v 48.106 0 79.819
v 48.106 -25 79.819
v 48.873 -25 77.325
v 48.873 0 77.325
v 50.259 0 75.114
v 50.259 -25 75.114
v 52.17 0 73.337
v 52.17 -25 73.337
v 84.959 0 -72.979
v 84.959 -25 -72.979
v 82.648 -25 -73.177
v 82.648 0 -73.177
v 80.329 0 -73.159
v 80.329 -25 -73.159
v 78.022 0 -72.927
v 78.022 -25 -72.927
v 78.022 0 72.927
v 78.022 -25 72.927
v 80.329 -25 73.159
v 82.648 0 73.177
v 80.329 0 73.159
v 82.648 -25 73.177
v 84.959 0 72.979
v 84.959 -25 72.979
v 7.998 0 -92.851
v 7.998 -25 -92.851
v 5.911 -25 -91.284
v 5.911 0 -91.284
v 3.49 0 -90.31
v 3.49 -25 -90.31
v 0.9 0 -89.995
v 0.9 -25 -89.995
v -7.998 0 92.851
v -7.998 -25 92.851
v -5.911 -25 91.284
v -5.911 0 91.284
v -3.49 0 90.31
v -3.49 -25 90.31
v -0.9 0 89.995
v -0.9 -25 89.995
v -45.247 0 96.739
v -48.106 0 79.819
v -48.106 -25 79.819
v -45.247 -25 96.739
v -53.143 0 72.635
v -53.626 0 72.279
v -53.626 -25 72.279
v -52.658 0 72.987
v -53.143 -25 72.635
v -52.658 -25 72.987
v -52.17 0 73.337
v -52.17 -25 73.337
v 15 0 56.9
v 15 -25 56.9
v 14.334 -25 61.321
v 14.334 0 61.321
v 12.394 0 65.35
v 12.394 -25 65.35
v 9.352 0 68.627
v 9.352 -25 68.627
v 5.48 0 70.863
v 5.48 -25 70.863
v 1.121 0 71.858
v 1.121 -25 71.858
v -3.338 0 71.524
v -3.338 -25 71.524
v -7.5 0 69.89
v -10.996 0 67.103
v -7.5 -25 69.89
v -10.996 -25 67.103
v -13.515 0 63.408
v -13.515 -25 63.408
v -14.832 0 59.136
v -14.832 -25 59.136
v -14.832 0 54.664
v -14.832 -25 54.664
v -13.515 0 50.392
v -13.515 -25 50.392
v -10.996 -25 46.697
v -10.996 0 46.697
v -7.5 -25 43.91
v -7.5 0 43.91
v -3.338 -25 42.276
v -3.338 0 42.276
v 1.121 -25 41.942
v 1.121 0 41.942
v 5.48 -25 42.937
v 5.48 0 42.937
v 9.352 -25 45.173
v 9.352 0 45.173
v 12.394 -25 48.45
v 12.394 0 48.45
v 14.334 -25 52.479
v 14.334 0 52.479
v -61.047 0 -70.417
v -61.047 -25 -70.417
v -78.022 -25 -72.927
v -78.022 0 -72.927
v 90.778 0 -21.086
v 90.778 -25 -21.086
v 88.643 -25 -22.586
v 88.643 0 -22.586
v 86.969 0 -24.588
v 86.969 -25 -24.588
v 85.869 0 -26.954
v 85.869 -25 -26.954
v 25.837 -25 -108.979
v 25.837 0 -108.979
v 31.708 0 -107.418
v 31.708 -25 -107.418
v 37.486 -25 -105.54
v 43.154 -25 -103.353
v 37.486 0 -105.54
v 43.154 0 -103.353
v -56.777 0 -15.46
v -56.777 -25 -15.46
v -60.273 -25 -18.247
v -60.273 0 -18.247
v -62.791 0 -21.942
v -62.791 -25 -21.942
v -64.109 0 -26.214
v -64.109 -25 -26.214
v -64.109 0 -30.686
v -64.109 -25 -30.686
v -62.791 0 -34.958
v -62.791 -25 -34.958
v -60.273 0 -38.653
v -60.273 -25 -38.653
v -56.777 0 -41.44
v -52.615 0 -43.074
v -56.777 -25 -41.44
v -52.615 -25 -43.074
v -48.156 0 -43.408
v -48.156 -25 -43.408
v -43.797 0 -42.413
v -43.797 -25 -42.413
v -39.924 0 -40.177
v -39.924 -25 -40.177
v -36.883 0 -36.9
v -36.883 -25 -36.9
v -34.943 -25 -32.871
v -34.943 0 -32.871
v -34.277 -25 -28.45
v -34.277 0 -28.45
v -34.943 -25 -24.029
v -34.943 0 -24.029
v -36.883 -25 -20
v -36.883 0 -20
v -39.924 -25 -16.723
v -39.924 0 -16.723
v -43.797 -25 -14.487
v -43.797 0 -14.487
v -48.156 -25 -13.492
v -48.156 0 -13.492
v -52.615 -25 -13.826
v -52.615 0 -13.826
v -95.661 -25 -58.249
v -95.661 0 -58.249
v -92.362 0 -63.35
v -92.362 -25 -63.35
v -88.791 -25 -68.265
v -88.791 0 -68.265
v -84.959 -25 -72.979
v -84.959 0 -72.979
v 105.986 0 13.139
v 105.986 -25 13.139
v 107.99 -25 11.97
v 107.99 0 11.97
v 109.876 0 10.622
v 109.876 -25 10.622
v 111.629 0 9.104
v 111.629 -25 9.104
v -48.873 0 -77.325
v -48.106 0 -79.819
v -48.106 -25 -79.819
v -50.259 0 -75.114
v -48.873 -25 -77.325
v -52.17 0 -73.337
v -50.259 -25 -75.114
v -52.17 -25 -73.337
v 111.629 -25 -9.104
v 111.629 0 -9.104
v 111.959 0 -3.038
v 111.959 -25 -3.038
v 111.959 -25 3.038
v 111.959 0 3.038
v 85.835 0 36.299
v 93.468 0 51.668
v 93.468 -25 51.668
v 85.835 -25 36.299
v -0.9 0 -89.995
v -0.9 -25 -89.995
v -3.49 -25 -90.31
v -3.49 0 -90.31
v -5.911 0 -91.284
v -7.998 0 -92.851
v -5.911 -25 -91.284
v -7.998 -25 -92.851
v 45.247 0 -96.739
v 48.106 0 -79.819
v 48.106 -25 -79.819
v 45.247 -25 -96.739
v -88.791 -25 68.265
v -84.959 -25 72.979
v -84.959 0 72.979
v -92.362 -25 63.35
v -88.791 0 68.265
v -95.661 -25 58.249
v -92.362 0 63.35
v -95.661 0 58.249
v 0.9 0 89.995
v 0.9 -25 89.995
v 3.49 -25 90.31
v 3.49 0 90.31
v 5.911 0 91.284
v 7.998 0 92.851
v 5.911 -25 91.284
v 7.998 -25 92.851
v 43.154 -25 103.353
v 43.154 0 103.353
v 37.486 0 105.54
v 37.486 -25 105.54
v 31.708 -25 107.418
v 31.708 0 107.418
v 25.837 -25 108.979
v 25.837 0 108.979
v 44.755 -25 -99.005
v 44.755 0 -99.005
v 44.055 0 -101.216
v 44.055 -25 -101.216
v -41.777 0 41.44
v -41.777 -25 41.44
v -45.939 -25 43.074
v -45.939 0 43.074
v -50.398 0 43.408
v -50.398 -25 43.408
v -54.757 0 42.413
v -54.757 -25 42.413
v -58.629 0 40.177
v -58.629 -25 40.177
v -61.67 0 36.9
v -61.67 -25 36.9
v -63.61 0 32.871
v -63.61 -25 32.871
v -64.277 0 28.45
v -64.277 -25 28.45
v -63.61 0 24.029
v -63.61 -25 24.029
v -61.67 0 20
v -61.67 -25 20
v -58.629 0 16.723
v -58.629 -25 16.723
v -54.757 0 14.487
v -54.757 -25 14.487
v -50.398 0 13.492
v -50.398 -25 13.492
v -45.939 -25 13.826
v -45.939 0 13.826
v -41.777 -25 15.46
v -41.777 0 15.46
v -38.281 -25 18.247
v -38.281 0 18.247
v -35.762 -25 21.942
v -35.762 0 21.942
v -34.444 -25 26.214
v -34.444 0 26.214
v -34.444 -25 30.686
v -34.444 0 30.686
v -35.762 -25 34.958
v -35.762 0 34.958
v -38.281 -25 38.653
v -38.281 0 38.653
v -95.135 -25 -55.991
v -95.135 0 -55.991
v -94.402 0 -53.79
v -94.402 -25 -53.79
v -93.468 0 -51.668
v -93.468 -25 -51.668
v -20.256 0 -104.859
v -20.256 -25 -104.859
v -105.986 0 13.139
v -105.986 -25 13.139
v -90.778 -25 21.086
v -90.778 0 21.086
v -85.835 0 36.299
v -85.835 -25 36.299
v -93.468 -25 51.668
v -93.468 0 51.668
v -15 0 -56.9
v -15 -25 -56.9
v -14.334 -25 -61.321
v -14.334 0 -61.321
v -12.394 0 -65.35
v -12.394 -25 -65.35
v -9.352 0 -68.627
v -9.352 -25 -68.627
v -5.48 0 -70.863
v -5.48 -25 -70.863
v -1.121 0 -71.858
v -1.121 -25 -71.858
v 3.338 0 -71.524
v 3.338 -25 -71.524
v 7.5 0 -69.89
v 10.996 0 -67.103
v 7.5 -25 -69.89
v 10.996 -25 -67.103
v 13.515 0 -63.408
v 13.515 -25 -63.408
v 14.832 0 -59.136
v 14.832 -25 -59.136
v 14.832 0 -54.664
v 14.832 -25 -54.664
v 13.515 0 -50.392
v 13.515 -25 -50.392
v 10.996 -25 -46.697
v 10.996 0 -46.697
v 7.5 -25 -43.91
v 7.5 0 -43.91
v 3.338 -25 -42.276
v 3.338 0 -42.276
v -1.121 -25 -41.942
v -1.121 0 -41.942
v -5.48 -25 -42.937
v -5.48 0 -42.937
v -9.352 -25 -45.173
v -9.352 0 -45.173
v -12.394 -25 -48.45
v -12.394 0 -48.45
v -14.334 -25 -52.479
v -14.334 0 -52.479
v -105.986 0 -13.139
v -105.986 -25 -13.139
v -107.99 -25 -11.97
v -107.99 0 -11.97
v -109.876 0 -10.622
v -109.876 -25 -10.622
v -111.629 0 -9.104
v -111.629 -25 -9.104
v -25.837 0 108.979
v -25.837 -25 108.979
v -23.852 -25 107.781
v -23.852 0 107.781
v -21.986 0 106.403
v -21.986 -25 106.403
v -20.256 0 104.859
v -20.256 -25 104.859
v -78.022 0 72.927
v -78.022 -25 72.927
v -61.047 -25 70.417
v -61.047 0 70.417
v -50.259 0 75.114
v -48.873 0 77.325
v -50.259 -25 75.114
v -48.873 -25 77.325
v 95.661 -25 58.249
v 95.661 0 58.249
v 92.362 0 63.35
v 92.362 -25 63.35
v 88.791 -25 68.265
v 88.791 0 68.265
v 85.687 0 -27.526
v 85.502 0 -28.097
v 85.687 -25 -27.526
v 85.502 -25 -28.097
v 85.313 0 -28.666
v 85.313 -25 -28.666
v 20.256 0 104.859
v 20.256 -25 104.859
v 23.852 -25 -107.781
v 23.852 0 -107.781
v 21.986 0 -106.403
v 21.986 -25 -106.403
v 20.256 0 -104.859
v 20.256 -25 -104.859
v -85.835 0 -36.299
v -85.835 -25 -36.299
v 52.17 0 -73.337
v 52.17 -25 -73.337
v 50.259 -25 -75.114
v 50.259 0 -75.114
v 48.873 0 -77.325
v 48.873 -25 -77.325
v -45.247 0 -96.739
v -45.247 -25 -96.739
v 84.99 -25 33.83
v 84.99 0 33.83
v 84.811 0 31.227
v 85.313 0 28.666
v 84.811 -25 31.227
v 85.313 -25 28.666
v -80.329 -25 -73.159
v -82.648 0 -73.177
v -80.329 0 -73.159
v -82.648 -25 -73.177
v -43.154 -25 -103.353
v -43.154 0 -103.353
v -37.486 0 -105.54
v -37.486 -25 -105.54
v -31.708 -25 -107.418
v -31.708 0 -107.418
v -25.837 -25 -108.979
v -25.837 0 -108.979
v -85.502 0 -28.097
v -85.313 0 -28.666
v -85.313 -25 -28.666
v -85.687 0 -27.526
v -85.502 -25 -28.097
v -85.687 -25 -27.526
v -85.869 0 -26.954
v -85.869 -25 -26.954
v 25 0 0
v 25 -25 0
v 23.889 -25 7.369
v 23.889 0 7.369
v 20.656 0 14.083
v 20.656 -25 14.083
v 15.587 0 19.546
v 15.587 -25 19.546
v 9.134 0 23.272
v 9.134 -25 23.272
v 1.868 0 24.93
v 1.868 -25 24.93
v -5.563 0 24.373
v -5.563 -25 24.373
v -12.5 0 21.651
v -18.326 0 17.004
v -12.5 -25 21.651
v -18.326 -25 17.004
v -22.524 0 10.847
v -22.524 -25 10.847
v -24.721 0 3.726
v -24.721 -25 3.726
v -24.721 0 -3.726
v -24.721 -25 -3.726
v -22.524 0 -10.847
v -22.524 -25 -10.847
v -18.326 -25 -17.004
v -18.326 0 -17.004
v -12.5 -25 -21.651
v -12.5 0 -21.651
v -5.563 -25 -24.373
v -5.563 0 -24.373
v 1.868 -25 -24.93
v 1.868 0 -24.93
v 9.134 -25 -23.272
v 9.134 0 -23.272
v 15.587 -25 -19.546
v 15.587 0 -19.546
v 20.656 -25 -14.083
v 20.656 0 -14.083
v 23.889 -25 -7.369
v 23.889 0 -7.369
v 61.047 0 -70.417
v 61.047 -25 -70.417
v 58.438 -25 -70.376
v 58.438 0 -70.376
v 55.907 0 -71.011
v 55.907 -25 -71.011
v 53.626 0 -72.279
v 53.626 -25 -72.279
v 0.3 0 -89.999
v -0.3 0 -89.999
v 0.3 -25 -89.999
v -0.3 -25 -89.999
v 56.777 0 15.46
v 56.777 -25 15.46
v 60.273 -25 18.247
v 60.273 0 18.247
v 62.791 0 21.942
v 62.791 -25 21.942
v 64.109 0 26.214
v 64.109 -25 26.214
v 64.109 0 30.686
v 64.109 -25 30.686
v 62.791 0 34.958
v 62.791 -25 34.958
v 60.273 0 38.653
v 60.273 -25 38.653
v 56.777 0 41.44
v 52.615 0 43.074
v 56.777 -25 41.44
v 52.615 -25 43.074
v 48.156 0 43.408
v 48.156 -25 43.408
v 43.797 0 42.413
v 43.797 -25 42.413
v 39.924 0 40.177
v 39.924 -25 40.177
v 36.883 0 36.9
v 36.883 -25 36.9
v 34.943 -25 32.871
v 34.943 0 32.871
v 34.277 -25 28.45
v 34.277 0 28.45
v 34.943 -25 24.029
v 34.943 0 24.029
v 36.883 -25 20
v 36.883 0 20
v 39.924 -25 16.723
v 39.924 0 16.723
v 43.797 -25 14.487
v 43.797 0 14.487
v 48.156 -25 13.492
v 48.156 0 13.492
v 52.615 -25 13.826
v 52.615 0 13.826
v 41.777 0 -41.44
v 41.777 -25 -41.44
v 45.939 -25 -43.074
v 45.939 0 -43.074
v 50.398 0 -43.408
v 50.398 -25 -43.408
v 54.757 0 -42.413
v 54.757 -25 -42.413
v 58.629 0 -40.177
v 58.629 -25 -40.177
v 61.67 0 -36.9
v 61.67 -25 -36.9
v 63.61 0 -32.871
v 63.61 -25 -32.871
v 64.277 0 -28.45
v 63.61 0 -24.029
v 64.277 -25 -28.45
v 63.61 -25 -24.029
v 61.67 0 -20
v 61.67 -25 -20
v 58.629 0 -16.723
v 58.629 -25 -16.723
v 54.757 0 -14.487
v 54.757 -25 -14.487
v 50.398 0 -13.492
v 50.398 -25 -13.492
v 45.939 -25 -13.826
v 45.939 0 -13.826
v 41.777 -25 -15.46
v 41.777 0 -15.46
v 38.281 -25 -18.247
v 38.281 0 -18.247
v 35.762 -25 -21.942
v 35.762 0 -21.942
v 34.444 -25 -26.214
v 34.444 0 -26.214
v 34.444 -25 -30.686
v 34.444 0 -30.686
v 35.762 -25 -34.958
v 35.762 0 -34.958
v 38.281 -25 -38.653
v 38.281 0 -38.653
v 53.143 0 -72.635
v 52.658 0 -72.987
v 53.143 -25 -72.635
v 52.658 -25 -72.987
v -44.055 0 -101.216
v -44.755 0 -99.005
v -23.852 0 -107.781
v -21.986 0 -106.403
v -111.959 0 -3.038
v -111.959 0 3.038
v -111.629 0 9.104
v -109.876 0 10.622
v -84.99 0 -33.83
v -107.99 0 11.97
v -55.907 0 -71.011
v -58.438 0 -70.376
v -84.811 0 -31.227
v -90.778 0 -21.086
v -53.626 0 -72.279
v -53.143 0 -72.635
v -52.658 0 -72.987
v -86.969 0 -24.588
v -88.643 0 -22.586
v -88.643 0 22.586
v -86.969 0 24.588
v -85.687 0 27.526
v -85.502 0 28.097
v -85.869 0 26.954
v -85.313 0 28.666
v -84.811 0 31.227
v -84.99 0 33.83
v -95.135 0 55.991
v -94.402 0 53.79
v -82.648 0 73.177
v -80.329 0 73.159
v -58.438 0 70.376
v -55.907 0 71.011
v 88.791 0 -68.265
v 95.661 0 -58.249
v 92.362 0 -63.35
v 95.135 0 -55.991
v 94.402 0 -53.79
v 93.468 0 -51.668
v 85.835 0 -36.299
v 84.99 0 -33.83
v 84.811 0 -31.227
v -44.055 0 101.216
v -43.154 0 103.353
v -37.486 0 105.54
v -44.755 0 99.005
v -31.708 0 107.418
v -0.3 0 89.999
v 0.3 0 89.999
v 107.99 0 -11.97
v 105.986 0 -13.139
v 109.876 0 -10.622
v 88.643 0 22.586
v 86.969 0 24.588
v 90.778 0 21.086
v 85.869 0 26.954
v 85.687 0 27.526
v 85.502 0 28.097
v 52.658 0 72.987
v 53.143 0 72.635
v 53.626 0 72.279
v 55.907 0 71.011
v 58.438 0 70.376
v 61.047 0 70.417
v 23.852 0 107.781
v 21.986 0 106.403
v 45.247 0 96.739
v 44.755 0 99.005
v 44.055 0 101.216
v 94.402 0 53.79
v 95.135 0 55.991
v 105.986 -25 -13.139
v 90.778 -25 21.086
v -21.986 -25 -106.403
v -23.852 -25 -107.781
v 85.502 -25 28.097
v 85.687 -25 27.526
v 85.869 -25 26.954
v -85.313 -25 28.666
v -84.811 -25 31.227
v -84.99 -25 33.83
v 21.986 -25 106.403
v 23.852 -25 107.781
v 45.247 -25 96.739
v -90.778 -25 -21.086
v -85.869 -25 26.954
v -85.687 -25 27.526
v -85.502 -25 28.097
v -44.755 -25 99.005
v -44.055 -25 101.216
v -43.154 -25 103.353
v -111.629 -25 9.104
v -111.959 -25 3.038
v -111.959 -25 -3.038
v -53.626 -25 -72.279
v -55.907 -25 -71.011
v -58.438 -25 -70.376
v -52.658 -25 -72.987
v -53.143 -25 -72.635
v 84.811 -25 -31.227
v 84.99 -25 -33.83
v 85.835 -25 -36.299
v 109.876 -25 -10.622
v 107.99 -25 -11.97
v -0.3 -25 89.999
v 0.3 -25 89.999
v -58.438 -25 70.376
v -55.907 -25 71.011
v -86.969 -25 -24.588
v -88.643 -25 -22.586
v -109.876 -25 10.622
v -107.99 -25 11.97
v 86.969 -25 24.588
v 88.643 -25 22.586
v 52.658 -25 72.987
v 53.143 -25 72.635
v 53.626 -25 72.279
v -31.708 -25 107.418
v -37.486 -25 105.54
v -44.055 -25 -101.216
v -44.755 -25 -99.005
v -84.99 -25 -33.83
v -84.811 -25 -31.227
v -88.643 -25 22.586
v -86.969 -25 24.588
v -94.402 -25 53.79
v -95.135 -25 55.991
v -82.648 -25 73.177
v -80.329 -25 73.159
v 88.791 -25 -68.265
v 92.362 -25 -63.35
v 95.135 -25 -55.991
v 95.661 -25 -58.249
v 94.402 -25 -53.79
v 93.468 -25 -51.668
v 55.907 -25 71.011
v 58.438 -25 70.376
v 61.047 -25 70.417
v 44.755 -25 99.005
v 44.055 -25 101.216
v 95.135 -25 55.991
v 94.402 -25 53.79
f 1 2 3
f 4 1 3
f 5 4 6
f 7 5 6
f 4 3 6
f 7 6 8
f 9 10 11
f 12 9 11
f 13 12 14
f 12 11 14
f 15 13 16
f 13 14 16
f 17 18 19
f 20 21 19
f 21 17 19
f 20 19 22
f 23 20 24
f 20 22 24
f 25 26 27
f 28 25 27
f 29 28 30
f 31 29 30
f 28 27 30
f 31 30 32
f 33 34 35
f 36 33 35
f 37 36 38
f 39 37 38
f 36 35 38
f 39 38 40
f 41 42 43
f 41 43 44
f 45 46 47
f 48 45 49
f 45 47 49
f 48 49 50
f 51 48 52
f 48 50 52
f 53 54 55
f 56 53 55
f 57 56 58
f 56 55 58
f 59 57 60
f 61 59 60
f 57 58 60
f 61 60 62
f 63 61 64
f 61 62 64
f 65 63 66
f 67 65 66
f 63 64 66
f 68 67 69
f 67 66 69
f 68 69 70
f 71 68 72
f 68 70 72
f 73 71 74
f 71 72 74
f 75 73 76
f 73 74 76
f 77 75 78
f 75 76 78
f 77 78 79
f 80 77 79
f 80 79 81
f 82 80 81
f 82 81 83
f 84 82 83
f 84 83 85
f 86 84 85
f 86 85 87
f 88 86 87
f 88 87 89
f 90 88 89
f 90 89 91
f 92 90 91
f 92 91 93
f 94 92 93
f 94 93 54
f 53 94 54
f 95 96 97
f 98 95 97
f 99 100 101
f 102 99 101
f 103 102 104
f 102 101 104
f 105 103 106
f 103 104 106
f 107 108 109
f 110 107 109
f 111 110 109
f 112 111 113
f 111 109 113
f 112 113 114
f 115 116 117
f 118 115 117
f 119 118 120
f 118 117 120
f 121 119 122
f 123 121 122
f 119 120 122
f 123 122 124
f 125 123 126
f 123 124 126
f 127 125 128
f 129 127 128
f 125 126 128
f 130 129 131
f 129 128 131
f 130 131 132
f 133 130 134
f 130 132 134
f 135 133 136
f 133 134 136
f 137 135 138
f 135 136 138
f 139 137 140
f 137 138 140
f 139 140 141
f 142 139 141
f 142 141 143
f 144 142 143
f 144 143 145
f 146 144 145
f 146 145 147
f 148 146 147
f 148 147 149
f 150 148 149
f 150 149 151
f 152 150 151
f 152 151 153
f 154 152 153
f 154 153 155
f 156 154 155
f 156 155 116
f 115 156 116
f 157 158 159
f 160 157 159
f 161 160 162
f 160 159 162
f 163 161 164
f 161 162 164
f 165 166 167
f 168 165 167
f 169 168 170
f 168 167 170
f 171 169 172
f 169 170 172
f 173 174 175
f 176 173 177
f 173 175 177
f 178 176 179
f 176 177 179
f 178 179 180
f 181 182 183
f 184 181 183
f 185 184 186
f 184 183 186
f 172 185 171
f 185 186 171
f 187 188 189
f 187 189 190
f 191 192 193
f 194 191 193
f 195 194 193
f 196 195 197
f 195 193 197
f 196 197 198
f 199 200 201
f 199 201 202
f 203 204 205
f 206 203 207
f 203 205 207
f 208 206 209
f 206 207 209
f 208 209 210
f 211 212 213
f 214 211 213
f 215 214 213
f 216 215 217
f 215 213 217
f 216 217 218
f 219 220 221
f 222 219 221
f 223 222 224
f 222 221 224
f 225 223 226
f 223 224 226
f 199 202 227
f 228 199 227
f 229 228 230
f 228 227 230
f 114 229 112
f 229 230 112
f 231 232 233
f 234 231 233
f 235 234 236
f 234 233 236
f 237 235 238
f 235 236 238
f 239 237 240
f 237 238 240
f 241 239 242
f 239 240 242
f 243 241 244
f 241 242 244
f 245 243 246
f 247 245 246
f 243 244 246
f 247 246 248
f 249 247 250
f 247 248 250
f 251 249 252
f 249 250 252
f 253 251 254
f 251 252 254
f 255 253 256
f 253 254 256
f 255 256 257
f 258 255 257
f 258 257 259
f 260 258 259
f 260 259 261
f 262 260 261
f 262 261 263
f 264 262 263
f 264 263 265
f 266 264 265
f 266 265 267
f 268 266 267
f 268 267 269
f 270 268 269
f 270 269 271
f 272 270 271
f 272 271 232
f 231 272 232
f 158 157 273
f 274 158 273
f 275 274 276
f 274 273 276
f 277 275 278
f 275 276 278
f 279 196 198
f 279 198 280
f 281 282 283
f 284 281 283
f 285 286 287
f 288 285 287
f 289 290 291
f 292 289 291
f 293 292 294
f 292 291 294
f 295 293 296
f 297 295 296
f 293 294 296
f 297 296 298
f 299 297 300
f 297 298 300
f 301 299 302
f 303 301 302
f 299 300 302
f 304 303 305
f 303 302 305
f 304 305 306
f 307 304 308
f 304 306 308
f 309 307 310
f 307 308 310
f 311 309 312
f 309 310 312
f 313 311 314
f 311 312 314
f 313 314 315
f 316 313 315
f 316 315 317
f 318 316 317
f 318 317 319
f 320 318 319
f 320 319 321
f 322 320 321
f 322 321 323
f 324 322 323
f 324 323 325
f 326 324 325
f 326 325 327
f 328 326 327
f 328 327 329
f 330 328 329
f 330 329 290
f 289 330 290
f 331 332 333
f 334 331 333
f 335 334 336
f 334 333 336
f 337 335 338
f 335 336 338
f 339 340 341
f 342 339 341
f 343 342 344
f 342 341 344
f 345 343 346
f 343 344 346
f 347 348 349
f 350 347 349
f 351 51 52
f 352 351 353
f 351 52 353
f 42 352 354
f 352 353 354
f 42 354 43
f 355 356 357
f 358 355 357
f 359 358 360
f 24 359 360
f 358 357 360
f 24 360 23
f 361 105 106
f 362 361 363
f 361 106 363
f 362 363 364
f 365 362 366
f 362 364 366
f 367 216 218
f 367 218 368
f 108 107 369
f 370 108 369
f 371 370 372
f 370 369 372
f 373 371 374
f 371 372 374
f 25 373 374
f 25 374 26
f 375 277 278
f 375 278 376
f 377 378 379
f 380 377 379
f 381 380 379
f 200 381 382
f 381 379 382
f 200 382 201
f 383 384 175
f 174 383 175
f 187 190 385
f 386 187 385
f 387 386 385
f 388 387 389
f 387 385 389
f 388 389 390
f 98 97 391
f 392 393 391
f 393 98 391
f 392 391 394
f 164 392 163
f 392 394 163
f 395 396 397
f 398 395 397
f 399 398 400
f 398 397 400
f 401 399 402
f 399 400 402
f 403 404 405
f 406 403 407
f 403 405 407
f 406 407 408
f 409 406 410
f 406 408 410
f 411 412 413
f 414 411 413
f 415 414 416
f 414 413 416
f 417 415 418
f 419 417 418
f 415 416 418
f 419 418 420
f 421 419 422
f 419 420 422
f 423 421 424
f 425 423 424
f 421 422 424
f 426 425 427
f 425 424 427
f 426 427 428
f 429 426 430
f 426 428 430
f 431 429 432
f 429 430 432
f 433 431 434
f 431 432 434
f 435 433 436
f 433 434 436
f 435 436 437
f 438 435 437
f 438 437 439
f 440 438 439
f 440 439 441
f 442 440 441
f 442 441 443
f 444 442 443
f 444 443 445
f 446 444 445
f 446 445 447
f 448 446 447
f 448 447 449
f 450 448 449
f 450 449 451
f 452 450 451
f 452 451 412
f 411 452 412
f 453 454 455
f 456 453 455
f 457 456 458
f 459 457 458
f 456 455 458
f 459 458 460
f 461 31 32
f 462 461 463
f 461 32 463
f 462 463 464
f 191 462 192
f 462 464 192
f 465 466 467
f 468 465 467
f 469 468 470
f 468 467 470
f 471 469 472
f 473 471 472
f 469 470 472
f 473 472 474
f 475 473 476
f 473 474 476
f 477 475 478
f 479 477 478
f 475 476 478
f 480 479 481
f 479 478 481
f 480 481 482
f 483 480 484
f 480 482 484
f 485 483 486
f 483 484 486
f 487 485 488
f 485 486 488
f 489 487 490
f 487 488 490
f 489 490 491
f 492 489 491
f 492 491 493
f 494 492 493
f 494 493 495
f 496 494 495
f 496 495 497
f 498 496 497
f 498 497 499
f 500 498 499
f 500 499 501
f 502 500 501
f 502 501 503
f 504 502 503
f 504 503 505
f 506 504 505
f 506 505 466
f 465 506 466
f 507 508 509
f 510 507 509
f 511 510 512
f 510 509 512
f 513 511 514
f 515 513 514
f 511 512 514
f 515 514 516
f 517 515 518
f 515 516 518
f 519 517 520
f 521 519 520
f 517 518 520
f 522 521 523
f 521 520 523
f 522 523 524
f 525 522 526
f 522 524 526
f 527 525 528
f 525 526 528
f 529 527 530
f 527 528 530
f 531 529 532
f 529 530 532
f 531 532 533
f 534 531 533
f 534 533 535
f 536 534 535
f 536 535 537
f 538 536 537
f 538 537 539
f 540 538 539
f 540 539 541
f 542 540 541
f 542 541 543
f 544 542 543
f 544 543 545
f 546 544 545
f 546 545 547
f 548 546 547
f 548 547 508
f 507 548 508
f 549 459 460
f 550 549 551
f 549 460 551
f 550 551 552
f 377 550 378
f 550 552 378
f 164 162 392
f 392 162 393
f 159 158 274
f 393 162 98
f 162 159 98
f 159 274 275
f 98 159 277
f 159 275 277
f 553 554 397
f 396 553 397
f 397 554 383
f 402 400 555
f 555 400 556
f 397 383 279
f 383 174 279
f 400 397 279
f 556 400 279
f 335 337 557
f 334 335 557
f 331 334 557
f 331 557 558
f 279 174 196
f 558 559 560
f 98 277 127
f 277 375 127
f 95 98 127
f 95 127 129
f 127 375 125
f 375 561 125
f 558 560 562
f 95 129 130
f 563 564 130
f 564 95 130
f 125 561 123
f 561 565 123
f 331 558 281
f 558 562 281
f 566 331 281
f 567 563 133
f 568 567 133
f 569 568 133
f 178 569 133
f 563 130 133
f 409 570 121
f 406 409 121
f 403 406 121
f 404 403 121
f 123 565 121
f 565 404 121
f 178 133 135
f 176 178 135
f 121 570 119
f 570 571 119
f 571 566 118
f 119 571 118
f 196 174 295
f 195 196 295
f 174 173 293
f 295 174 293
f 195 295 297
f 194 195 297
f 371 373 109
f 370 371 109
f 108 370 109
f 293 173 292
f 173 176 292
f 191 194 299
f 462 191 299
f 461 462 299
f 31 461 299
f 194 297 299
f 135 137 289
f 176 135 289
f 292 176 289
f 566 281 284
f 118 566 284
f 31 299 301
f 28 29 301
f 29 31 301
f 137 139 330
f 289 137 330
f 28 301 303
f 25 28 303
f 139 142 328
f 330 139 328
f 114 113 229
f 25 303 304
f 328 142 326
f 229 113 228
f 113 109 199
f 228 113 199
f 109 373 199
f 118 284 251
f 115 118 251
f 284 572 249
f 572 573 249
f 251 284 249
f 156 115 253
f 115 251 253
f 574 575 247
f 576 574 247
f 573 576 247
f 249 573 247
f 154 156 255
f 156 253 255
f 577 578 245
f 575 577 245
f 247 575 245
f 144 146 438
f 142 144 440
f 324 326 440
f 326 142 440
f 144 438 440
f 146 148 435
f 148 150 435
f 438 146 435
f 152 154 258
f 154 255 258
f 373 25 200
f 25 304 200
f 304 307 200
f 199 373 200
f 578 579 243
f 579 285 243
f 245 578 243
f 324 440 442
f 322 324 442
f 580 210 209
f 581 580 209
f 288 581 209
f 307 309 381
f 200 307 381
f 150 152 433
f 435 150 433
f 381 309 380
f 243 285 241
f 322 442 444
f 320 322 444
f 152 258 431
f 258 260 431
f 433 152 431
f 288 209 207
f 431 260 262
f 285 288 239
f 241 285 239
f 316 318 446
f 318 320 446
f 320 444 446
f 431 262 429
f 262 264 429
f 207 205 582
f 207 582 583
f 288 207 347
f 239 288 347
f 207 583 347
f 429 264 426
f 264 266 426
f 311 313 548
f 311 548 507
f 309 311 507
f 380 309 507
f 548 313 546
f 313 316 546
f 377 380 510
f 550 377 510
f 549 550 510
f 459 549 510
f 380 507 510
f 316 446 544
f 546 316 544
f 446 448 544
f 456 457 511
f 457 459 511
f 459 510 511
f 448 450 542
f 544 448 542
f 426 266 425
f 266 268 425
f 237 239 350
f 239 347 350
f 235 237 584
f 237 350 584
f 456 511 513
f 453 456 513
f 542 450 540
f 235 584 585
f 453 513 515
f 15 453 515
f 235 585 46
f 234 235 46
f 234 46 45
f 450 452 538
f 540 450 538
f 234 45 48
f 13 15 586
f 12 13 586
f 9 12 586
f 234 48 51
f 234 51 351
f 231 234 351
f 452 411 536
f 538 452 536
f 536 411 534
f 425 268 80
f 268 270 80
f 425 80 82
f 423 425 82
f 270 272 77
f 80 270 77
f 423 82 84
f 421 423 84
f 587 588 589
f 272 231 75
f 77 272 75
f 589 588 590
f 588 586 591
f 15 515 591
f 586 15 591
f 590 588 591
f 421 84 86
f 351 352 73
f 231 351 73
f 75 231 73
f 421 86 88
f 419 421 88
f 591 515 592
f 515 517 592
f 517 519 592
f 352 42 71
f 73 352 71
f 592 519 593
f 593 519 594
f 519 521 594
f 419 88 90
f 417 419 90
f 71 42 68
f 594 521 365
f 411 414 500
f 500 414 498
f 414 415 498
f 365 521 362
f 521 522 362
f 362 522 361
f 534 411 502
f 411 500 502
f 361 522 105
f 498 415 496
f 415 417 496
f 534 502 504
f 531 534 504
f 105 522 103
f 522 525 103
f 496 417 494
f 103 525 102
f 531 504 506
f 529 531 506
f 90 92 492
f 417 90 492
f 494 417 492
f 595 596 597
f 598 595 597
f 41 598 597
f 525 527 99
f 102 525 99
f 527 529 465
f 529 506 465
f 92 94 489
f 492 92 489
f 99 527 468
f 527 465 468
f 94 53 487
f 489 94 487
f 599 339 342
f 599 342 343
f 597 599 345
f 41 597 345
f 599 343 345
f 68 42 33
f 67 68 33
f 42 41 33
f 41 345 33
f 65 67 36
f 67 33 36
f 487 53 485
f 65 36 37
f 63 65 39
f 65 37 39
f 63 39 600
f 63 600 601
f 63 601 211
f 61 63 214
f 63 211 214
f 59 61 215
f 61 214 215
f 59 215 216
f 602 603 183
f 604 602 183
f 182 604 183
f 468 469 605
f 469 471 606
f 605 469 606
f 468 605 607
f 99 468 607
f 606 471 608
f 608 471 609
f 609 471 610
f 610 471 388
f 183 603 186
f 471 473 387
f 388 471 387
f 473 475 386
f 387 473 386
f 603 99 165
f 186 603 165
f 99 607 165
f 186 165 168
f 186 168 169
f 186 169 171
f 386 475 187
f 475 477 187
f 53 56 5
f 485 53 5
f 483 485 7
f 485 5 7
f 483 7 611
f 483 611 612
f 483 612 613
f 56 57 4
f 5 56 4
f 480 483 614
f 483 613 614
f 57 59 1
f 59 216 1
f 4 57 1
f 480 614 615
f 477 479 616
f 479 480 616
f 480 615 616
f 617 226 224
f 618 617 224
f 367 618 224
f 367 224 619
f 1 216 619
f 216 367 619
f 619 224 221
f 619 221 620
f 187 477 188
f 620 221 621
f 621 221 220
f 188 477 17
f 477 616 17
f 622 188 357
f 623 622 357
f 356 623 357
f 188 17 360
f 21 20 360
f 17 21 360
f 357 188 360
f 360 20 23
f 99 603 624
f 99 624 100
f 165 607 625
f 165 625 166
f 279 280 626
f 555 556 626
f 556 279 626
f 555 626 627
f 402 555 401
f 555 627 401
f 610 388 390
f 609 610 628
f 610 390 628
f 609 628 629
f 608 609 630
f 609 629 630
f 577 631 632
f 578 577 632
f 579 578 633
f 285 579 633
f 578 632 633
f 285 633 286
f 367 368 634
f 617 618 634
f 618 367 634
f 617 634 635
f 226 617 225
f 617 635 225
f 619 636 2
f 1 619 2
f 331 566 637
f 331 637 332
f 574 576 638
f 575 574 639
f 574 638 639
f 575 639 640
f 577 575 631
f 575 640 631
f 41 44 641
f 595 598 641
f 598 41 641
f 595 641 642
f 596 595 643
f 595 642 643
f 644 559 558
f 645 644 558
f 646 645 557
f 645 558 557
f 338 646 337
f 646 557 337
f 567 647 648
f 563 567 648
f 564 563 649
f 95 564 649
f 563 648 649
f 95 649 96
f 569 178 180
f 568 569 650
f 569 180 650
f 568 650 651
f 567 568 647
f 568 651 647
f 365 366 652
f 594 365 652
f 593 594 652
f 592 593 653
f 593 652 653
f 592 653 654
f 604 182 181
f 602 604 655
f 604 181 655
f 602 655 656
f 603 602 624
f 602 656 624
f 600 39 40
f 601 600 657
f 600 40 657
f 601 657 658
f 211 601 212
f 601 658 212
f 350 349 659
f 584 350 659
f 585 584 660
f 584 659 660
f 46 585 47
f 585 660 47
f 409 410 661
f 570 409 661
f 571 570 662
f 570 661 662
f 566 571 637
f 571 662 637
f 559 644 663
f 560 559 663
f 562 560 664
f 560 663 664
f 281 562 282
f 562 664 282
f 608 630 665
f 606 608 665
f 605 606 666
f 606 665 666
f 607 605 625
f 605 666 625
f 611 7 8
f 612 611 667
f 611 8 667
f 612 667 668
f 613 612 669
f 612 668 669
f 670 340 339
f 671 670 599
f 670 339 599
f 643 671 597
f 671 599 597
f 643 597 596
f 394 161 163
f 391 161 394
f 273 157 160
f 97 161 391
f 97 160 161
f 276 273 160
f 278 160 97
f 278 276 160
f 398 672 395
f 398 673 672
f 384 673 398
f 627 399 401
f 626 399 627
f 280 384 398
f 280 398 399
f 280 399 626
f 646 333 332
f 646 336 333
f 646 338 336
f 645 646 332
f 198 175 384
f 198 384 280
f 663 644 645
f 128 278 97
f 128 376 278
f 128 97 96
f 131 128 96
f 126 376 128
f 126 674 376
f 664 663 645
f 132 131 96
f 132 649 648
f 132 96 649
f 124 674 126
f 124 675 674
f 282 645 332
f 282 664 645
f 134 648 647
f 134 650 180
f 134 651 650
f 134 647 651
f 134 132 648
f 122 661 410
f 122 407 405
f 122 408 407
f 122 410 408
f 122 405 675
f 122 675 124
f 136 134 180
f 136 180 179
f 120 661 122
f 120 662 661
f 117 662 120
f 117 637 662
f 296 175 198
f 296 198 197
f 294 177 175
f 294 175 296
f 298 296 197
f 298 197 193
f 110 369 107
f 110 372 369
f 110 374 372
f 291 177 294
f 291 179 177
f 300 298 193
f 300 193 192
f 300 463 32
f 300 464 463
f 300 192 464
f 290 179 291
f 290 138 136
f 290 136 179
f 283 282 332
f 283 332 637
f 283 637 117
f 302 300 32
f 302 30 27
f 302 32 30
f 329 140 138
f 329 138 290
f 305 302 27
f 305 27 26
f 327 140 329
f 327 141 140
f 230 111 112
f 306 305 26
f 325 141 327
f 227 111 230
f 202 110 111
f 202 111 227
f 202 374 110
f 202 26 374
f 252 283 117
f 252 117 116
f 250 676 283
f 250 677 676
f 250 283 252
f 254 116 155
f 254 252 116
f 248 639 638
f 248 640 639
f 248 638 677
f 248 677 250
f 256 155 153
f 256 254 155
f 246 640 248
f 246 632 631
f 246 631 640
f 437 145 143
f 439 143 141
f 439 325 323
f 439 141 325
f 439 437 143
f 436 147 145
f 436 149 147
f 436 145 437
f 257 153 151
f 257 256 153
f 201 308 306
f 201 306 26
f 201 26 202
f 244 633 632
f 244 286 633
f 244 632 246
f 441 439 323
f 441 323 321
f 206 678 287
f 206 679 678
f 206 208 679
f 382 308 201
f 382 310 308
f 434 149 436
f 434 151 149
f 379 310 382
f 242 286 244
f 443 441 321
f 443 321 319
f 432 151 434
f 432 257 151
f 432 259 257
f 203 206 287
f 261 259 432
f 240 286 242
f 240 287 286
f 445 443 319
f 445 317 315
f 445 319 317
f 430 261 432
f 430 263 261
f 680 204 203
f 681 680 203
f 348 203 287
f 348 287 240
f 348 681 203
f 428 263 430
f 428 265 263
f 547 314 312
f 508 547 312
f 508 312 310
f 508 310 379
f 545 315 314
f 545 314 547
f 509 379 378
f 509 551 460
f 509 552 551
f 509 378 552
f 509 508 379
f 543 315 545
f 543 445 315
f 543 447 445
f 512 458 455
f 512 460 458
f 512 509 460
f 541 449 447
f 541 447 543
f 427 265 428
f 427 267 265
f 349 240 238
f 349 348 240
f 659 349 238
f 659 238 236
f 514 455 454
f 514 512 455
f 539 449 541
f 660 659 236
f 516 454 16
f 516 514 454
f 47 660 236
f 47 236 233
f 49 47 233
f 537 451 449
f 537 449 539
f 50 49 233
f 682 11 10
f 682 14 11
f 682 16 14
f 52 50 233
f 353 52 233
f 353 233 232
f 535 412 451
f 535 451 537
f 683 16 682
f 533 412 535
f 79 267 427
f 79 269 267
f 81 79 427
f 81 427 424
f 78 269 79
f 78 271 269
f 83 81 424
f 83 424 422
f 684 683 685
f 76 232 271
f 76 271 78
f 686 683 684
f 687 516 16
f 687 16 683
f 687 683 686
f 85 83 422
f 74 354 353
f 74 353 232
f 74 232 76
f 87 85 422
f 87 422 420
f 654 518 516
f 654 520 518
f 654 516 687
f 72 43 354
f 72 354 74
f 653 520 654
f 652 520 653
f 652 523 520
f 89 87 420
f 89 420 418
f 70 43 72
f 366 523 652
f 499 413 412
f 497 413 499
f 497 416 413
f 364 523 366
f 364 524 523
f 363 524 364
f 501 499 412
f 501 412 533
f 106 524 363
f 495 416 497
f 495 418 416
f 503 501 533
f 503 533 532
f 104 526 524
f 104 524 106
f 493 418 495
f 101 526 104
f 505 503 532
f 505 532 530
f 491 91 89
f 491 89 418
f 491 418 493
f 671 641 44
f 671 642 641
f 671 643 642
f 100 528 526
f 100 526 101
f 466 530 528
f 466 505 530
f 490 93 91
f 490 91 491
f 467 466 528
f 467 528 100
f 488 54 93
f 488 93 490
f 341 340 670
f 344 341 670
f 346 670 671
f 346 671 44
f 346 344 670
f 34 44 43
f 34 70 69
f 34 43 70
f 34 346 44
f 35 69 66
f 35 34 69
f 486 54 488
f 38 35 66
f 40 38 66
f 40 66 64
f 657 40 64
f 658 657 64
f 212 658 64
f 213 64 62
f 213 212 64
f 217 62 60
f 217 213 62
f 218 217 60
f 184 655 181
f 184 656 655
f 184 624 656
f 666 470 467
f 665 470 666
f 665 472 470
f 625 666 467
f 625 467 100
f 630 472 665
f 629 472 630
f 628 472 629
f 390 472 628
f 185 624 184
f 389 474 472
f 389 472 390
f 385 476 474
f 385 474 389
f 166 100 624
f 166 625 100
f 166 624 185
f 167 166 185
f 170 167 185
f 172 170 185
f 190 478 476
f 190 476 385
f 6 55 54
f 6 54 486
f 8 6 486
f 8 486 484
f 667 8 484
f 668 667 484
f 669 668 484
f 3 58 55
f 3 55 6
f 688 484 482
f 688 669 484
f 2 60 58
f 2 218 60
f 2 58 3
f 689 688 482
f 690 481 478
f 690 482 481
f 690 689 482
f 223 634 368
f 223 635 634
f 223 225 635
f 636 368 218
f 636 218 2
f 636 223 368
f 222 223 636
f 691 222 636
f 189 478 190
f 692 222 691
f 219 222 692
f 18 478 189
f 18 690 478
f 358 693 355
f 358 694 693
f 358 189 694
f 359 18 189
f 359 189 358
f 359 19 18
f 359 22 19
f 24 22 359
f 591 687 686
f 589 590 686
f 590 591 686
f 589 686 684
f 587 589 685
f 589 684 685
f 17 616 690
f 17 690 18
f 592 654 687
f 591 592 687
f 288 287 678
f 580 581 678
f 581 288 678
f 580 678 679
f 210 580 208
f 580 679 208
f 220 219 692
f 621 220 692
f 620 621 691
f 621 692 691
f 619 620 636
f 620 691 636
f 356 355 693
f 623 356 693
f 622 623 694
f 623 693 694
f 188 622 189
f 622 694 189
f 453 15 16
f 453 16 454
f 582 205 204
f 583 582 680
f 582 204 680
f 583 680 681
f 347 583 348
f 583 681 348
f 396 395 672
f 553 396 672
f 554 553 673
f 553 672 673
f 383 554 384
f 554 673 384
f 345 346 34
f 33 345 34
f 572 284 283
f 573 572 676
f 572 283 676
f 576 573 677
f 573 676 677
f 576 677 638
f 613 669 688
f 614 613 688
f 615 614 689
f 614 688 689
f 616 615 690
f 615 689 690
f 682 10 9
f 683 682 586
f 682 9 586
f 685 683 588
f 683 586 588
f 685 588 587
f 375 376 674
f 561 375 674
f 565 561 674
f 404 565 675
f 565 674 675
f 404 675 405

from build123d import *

# Parameters (mm, degrees)
F1_DEPTH        = 25
F3_DEPTH        = 25.001
F3_COPIES_COUNT = 10
F4_R            = 25
F5_DEPTH        = 25.001
F6_R            = 15
F7_DEPTH        = 25.001
F7_COPIES_COUNT = 6


# Not quite as in the source:
# - a pattern or mirror of a feature is missing from the dataset's text; its kind, count and spacing are read off the source's solid


with BuildPart() as f1:
    # F0 (on Front) → F1 (new body)
    with BuildSketch(Plane.XZ):
        with BuildLine():
            Line((-8.9100863455, 98.6570205686), (0, 100))
            Line((0, 100), (13.2558165823, 98.002007127))
            Line((13.2558165823, 98.002007127), (20.2559942473, 104.8591660301))
            ThreePointArc((20.2559942473, 104.8591660301), (22.9030212669, 107.1136465319), (25.8372403083, 108.979066858))
            ThreePointArc((25.8372403083, 108.979066858), (0, 112), (-25.8372403083, 108.979066858))
            ThreePointArc((-25.8372403083, 108.979066858), (-22.9030212669, 107.1136465319), (-20.2559942473, 104.8591660301))
            Line((-20.2559942473, 104.8591660301), (-13.2558165823, 98.002007127))
            Line((-13.2558165823, 98.002007127), (-8.9100863455, 98.6570205686))
        make_face()
        with BuildLine():
            Line((20.2559942473, 104.8591660301), (13.2558165823, 98.002007127))
            Line((13.2558165823, 98.002007127), (29.4755174411, 95.5572805786))
            Line((29.4755174411, 95.5572805786), (56.3320058064, 82.6238774316))
            Line((56.3320058064, 82.6238774316), (78.1831482468, 62.3489801859))
            Line((78.1831482468, 62.3489801859), (93.0873748644, 36.5341024366))
            Line((93.0873748644, 36.5341024366), (99.7203797181, 7.4730093586))
            Line((99.7203797181, 7.4730093586), (97.4927912182, -22.2520933956))
            Line((97.4927912182, -22.2520933956), (86.6025403784, -50))
            Line((86.6025403784, -50), (68.0172737771, -73.305187183))
            Line((68.0172737771, -73.305187183), (43.3883739118, -90.0968867902))
            Line((43.3883739118, -90.0968867902), (14.9042266176, -98.8830826225))
            Line((14.9042266176, -98.8830826225), (-14.9042266176, -98.8830826225))
            Line((-14.9042266176, -98.8830826225), (-43.3883739118, -90.0968867902))
            Line((-43.3883739118, -90.0968867902), (-68.0172737771, -73.305187183))
            Line((-68.0172737771, -73.305187183), (-86.6025403784, -50))
            Line((-86.6025403784, -50), (-97.4927912182, -22.2520933956))
            Line((-97.4927912182, -22.2520933956), (-99.7203797181, 7.4730093586))
            Line((-99.7203797181, 7.4730093586), (-93.0873748644, 36.5341024366))
            Line((-93.0873748644, 36.5341024366), (-78.1831482468, 62.3489801859))
            Line((-78.1831482468, 62.3489801859), (-56.3320058064, 82.6238774316))
            Line((-56.3320058064, 82.6238774316), (-29.4755174411, 95.5572805786))
            Line((-29.4755174411, 95.5572805786), (-13.2558165823, 98.002007127))
            Line((-13.2558165823, 98.002007127), (-20.2559942473, 104.8591660301))
            ThreePointArc((-20.2559942473, 104.8591660301), (-22.9030212669, 107.1136465319), (-25.8372403083, 108.979066858))
            ThreePointArc((-25.8372403083, 108.979066858), (-69.463044439, -87.857187852), (112, 0))
            ThreePointArc((112, 0), (87.857187852, 69.463044439), (25.8372403083, 108.979066858))
            ThreePointArc((25.8372403083, 108.979066858), (22.9030212669, 107.1136465319), (20.2559942473, 104.8591660301))
        make_face()
        with BuildLine():
            ThreePointArc((90, 0), (63.957016816, 63.3206127576), (0.9, 89.9954998875))
            ThreePointArc((0.9, 89.9954998875), (0, 90), (-0.9, 89.9954998875))
            ThreePointArc((-0.9, 89.9954998875), (-63.3206127576, -63.957016816), (90, 0))
        make_face()
        with BuildLine():
            Line((29.4755174411, 95.5572805786), (13.2558165823, 98.002007127))
            Line((13.2558165823, 98.002007127), (7.9977160698, 92.851333463))
            ThreePointArc((7.9977160698, 92.851333463), (4.7327694943, 90.7178003028), (0.9, 89.9954998875))
            ThreePointArc((0.9, 89.9954998875), (63.957016816, 63.3206127576), (90, 0))
            ThreePointArc((90, 0), (-63.3206127576, -63.957016816), (-0.9, 89.9954998875))
            ThreePointArc((-0.9, 89.9954998875), (-4.7327694943, 90.7178003028), (-7.9977160698, 92.851333463))
            Line((-7.9977160698, 92.851333463), (-13.2558165823, 98.002007127))
            Line((-13.2558165823, 98.002007127), (-29.4755174411, 95.5572805786))
            Line((-29.4755174411, 95.5572805786), (-56.3320058064, 82.6238774316))
            Line((-56.3320058064, 82.6238774316), (-78.1831482468, 62.3489801859))
            Line((-78.1831482468, 62.3489801859), (-93.0873748644, 36.5341024366))
            Line((-93.0873748644, 36.5341024366), (-99.7203797181, 7.4730093586))
            Line((-99.7203797181, 7.4730093586), (-97.4927912182, -22.2520933956))
            Line((-97.4927912182, -22.2520933956), (-86.6025403784, -50))
            Line((-86.6025403784, -50), (-68.0172737771, -73.305187183))
            Line((-68.0172737771, -73.305187183), (-43.3883739118, -90.0968867902))
            Line((-43.3883739118, -90.0968867902), (-14.9042266176, -98.8830826225))
            Line((-14.9042266176, -98.8830826225), (14.9042266176, -98.8830826225))
            Line((14.9042266176, -98.8830826225), (43.3883739118, -90.0968867902))
            Line((43.3883739118, -90.0968867902), (68.0172737771, -73.305187183))
            Line((68.0172737771, -73.305187183), (86.6025403784, -50))
            Line((86.6025403784, -50), (97.4927912182, -22.2520933956))
            Line((97.4927912182, -22.2520933956), (99.7203797181, 7.4730093586))
            Line((99.7203797181, 7.4730093586), (93.0873748644, 36.5341024366))
            Line((93.0873748644, 36.5341024366), (78.1831482468, 62.3489801859))
            Line((78.1831482468, 62.3489801859), (56.3320058064, 82.6238774316))
            Line((56.3320058064, 82.6238774316), (29.4755174411, 95.5572805786))
        make_face()
        with BuildLine():
            Line((13.2558165823, 98.002007127), (0, 100))
            Line((0, 100), (-8.9100863455, 98.6570205686))
            Line((-8.9100863455, 98.6570205686), (-13.2558165823, 98.002007127))
            Line((-13.2558165823, 98.002007127), (-7.9977160698, 92.851333463))
            ThreePointArc((-7.9977160698, 92.851333463), (-4.7327694943, 90.7178003028), (-0.9, 89.9954998875))
            ThreePointArc((-0.9, 89.9954998875), (0, 90), (0.9, 89.9954998875))
            ThreePointArc((0.9, 89.9954998875), (4.7327694943, 90.7178003028), (7.9977160698, 92.851333463))
            Line((7.9977160698, 92.851333463), (13.2558165823, 98.002007127))
        make_face()
    extrude(amount=F1_DEPTH)

    # F2 (on face) → F3 (cut, through all)
    with BuildSketch(Plane.XZ.offset(25)):
        with BuildLine():
            ThreePointArc((-25.8372403083, 108.979066858), (-22.9030212669, 107.1136465319), (-20.2559942473, 104.8591660301))
            Line((-20.2559942473, 104.8591660301), (-7.9977160698, 92.851333463))
            ThreePointArc((-7.9977160698, 92.851333463), (-4.7327694943, 90.7178003028), (-0.9, 89.9954998875))
            ThreePointArc((-0.9, 89.9954998875), (0, 90), (0.9, 89.9954998875))
            ThreePointArc((0.9, 89.9954998875), (4.7327694943, 90.7178003028), (7.9977160698, 92.851333463))
            Line((7.9977160698, 92.851333463), (20.2559942473, 104.8591660301))
            ThreePointArc((20.2559942473, 104.8591660301), (22.9030212669, 107.1136465319), (25.8372403083, 108.979066858))
            ThreePointArc((25.8372403083, 108.979066858), (0, 112), (-25.8372403083, 108.979066858))
        make_face()
    f3 = extrude(amount=-F3_DEPTH, mode=Mode.SUBTRACT)

    # F3_copies: F3 ×10 about axis
    f3_copies_axis = Axis((0, 0, 0), (0, 1, 0))
    for i in range(1, F3_COPIES_COUNT):
        add(f3.rotate(f3_copies_axis, i * 360 / F3_COPIES_COUNT), mode=Mode.SUBTRACT)

    # F4 (on face) → F5 (cut, through all)
    with BuildSketch(Plane.XZ.offset(25)):
        Circle(F4_R)
    extrude(amount=-F5_DEPTH, mode=Mode.SUBTRACT)

    # F6 (on face) → F7 (cut, through all)
    with BuildSketch(Plane.XZ.offset(25)):
        with Locations((0, 56.8999728613)):
            Circle(F6_R)
    f7 = extrude(amount=-F7_DEPTH, mode=Mode.SUBTRACT)

    # F7_copies: F7 ×6 about axis
    f7_copies_axis = Axis((0, 0, 0), (0, 1, 0))
    for i in range(1, F7_COPIES_COUNT):
        add(f7.rotate(f7_copies_axis, i * 360 / F7_COPIES_COUNT), mode=Mode.SUBTRACT)


solid = f1.part
